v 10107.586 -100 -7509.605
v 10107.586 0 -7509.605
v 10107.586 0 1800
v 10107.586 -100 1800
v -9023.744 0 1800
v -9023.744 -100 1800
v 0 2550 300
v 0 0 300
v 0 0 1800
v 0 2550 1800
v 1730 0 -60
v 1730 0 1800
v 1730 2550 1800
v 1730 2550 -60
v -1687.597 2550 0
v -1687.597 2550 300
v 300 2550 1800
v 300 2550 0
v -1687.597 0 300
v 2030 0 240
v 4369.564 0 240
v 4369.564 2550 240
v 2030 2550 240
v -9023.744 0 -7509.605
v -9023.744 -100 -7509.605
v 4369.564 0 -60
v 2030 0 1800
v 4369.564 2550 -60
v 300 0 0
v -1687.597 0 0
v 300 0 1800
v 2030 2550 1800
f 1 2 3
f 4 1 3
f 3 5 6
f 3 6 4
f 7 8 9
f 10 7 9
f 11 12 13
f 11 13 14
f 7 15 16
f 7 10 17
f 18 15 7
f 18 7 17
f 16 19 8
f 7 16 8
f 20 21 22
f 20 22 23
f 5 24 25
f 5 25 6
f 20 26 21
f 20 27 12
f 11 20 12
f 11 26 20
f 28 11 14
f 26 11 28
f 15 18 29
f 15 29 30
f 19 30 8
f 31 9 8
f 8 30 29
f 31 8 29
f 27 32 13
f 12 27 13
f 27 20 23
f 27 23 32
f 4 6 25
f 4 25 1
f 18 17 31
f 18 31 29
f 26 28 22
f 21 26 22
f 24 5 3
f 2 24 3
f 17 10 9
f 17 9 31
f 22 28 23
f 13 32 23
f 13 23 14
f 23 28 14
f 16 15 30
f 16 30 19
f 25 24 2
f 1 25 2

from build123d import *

# Parameters (mm, degrees)
BOSS_EXTRUDE1_DEPTH   = 2550
BOSS_EXTRUDE1_2_DEPTH = 2550
SKETCH2_W             = 19131.32997412
SKETCH2_H             = 9309.604753216
BOSS_EXTRUDE2_DEPTH   = 100


with BuildPart() as part:
    # Sketch1 → Boss-Extrude1 (new body)
    with BuildSketch(Plane(origin=(0, 0, 0), x_dir=(1, 0, 0), z_dir=(0, 1, 0))):
        Polygon((300, 0), (-1687.597138015, 0), (-1687.597138015, -300), (0, -300), (0, -1800), (300, -1800), align=None)
    extrude(amount=BOSS_EXTRUDE1_DEPTH)


with BuildPart() as body_2:
    # Sketch1 → Boss-Extrude1 2 (new body)
    with BuildSketch(Plane(origin=(0, 0, 0), x_dir=(1, 0, 0), z_dir=(0, 1, 0))):
        Polygon((1730, 60), (4369.564447806, 60), (4369.564447806, -240), (2030, -240), (2030, -1800), (1730, -1800), align=None)
    extrude(amount=BOSS_EXTRUDE1_2_DEPTH)


with BuildPart() as body_3:
    # Sketch2 → Boss-Extrude2 (new body)
    with BuildSketch(Plane.XZ):
        with Locations((541.921421212, -2854.802376608)):
            Rectangle(SKETCH2_W, SKETCH2_H)
    extrude(amount=BOSS_EXTRUDE2_DEPTH)


solid = Compound([part.part, body_2.part, body_3.part])
